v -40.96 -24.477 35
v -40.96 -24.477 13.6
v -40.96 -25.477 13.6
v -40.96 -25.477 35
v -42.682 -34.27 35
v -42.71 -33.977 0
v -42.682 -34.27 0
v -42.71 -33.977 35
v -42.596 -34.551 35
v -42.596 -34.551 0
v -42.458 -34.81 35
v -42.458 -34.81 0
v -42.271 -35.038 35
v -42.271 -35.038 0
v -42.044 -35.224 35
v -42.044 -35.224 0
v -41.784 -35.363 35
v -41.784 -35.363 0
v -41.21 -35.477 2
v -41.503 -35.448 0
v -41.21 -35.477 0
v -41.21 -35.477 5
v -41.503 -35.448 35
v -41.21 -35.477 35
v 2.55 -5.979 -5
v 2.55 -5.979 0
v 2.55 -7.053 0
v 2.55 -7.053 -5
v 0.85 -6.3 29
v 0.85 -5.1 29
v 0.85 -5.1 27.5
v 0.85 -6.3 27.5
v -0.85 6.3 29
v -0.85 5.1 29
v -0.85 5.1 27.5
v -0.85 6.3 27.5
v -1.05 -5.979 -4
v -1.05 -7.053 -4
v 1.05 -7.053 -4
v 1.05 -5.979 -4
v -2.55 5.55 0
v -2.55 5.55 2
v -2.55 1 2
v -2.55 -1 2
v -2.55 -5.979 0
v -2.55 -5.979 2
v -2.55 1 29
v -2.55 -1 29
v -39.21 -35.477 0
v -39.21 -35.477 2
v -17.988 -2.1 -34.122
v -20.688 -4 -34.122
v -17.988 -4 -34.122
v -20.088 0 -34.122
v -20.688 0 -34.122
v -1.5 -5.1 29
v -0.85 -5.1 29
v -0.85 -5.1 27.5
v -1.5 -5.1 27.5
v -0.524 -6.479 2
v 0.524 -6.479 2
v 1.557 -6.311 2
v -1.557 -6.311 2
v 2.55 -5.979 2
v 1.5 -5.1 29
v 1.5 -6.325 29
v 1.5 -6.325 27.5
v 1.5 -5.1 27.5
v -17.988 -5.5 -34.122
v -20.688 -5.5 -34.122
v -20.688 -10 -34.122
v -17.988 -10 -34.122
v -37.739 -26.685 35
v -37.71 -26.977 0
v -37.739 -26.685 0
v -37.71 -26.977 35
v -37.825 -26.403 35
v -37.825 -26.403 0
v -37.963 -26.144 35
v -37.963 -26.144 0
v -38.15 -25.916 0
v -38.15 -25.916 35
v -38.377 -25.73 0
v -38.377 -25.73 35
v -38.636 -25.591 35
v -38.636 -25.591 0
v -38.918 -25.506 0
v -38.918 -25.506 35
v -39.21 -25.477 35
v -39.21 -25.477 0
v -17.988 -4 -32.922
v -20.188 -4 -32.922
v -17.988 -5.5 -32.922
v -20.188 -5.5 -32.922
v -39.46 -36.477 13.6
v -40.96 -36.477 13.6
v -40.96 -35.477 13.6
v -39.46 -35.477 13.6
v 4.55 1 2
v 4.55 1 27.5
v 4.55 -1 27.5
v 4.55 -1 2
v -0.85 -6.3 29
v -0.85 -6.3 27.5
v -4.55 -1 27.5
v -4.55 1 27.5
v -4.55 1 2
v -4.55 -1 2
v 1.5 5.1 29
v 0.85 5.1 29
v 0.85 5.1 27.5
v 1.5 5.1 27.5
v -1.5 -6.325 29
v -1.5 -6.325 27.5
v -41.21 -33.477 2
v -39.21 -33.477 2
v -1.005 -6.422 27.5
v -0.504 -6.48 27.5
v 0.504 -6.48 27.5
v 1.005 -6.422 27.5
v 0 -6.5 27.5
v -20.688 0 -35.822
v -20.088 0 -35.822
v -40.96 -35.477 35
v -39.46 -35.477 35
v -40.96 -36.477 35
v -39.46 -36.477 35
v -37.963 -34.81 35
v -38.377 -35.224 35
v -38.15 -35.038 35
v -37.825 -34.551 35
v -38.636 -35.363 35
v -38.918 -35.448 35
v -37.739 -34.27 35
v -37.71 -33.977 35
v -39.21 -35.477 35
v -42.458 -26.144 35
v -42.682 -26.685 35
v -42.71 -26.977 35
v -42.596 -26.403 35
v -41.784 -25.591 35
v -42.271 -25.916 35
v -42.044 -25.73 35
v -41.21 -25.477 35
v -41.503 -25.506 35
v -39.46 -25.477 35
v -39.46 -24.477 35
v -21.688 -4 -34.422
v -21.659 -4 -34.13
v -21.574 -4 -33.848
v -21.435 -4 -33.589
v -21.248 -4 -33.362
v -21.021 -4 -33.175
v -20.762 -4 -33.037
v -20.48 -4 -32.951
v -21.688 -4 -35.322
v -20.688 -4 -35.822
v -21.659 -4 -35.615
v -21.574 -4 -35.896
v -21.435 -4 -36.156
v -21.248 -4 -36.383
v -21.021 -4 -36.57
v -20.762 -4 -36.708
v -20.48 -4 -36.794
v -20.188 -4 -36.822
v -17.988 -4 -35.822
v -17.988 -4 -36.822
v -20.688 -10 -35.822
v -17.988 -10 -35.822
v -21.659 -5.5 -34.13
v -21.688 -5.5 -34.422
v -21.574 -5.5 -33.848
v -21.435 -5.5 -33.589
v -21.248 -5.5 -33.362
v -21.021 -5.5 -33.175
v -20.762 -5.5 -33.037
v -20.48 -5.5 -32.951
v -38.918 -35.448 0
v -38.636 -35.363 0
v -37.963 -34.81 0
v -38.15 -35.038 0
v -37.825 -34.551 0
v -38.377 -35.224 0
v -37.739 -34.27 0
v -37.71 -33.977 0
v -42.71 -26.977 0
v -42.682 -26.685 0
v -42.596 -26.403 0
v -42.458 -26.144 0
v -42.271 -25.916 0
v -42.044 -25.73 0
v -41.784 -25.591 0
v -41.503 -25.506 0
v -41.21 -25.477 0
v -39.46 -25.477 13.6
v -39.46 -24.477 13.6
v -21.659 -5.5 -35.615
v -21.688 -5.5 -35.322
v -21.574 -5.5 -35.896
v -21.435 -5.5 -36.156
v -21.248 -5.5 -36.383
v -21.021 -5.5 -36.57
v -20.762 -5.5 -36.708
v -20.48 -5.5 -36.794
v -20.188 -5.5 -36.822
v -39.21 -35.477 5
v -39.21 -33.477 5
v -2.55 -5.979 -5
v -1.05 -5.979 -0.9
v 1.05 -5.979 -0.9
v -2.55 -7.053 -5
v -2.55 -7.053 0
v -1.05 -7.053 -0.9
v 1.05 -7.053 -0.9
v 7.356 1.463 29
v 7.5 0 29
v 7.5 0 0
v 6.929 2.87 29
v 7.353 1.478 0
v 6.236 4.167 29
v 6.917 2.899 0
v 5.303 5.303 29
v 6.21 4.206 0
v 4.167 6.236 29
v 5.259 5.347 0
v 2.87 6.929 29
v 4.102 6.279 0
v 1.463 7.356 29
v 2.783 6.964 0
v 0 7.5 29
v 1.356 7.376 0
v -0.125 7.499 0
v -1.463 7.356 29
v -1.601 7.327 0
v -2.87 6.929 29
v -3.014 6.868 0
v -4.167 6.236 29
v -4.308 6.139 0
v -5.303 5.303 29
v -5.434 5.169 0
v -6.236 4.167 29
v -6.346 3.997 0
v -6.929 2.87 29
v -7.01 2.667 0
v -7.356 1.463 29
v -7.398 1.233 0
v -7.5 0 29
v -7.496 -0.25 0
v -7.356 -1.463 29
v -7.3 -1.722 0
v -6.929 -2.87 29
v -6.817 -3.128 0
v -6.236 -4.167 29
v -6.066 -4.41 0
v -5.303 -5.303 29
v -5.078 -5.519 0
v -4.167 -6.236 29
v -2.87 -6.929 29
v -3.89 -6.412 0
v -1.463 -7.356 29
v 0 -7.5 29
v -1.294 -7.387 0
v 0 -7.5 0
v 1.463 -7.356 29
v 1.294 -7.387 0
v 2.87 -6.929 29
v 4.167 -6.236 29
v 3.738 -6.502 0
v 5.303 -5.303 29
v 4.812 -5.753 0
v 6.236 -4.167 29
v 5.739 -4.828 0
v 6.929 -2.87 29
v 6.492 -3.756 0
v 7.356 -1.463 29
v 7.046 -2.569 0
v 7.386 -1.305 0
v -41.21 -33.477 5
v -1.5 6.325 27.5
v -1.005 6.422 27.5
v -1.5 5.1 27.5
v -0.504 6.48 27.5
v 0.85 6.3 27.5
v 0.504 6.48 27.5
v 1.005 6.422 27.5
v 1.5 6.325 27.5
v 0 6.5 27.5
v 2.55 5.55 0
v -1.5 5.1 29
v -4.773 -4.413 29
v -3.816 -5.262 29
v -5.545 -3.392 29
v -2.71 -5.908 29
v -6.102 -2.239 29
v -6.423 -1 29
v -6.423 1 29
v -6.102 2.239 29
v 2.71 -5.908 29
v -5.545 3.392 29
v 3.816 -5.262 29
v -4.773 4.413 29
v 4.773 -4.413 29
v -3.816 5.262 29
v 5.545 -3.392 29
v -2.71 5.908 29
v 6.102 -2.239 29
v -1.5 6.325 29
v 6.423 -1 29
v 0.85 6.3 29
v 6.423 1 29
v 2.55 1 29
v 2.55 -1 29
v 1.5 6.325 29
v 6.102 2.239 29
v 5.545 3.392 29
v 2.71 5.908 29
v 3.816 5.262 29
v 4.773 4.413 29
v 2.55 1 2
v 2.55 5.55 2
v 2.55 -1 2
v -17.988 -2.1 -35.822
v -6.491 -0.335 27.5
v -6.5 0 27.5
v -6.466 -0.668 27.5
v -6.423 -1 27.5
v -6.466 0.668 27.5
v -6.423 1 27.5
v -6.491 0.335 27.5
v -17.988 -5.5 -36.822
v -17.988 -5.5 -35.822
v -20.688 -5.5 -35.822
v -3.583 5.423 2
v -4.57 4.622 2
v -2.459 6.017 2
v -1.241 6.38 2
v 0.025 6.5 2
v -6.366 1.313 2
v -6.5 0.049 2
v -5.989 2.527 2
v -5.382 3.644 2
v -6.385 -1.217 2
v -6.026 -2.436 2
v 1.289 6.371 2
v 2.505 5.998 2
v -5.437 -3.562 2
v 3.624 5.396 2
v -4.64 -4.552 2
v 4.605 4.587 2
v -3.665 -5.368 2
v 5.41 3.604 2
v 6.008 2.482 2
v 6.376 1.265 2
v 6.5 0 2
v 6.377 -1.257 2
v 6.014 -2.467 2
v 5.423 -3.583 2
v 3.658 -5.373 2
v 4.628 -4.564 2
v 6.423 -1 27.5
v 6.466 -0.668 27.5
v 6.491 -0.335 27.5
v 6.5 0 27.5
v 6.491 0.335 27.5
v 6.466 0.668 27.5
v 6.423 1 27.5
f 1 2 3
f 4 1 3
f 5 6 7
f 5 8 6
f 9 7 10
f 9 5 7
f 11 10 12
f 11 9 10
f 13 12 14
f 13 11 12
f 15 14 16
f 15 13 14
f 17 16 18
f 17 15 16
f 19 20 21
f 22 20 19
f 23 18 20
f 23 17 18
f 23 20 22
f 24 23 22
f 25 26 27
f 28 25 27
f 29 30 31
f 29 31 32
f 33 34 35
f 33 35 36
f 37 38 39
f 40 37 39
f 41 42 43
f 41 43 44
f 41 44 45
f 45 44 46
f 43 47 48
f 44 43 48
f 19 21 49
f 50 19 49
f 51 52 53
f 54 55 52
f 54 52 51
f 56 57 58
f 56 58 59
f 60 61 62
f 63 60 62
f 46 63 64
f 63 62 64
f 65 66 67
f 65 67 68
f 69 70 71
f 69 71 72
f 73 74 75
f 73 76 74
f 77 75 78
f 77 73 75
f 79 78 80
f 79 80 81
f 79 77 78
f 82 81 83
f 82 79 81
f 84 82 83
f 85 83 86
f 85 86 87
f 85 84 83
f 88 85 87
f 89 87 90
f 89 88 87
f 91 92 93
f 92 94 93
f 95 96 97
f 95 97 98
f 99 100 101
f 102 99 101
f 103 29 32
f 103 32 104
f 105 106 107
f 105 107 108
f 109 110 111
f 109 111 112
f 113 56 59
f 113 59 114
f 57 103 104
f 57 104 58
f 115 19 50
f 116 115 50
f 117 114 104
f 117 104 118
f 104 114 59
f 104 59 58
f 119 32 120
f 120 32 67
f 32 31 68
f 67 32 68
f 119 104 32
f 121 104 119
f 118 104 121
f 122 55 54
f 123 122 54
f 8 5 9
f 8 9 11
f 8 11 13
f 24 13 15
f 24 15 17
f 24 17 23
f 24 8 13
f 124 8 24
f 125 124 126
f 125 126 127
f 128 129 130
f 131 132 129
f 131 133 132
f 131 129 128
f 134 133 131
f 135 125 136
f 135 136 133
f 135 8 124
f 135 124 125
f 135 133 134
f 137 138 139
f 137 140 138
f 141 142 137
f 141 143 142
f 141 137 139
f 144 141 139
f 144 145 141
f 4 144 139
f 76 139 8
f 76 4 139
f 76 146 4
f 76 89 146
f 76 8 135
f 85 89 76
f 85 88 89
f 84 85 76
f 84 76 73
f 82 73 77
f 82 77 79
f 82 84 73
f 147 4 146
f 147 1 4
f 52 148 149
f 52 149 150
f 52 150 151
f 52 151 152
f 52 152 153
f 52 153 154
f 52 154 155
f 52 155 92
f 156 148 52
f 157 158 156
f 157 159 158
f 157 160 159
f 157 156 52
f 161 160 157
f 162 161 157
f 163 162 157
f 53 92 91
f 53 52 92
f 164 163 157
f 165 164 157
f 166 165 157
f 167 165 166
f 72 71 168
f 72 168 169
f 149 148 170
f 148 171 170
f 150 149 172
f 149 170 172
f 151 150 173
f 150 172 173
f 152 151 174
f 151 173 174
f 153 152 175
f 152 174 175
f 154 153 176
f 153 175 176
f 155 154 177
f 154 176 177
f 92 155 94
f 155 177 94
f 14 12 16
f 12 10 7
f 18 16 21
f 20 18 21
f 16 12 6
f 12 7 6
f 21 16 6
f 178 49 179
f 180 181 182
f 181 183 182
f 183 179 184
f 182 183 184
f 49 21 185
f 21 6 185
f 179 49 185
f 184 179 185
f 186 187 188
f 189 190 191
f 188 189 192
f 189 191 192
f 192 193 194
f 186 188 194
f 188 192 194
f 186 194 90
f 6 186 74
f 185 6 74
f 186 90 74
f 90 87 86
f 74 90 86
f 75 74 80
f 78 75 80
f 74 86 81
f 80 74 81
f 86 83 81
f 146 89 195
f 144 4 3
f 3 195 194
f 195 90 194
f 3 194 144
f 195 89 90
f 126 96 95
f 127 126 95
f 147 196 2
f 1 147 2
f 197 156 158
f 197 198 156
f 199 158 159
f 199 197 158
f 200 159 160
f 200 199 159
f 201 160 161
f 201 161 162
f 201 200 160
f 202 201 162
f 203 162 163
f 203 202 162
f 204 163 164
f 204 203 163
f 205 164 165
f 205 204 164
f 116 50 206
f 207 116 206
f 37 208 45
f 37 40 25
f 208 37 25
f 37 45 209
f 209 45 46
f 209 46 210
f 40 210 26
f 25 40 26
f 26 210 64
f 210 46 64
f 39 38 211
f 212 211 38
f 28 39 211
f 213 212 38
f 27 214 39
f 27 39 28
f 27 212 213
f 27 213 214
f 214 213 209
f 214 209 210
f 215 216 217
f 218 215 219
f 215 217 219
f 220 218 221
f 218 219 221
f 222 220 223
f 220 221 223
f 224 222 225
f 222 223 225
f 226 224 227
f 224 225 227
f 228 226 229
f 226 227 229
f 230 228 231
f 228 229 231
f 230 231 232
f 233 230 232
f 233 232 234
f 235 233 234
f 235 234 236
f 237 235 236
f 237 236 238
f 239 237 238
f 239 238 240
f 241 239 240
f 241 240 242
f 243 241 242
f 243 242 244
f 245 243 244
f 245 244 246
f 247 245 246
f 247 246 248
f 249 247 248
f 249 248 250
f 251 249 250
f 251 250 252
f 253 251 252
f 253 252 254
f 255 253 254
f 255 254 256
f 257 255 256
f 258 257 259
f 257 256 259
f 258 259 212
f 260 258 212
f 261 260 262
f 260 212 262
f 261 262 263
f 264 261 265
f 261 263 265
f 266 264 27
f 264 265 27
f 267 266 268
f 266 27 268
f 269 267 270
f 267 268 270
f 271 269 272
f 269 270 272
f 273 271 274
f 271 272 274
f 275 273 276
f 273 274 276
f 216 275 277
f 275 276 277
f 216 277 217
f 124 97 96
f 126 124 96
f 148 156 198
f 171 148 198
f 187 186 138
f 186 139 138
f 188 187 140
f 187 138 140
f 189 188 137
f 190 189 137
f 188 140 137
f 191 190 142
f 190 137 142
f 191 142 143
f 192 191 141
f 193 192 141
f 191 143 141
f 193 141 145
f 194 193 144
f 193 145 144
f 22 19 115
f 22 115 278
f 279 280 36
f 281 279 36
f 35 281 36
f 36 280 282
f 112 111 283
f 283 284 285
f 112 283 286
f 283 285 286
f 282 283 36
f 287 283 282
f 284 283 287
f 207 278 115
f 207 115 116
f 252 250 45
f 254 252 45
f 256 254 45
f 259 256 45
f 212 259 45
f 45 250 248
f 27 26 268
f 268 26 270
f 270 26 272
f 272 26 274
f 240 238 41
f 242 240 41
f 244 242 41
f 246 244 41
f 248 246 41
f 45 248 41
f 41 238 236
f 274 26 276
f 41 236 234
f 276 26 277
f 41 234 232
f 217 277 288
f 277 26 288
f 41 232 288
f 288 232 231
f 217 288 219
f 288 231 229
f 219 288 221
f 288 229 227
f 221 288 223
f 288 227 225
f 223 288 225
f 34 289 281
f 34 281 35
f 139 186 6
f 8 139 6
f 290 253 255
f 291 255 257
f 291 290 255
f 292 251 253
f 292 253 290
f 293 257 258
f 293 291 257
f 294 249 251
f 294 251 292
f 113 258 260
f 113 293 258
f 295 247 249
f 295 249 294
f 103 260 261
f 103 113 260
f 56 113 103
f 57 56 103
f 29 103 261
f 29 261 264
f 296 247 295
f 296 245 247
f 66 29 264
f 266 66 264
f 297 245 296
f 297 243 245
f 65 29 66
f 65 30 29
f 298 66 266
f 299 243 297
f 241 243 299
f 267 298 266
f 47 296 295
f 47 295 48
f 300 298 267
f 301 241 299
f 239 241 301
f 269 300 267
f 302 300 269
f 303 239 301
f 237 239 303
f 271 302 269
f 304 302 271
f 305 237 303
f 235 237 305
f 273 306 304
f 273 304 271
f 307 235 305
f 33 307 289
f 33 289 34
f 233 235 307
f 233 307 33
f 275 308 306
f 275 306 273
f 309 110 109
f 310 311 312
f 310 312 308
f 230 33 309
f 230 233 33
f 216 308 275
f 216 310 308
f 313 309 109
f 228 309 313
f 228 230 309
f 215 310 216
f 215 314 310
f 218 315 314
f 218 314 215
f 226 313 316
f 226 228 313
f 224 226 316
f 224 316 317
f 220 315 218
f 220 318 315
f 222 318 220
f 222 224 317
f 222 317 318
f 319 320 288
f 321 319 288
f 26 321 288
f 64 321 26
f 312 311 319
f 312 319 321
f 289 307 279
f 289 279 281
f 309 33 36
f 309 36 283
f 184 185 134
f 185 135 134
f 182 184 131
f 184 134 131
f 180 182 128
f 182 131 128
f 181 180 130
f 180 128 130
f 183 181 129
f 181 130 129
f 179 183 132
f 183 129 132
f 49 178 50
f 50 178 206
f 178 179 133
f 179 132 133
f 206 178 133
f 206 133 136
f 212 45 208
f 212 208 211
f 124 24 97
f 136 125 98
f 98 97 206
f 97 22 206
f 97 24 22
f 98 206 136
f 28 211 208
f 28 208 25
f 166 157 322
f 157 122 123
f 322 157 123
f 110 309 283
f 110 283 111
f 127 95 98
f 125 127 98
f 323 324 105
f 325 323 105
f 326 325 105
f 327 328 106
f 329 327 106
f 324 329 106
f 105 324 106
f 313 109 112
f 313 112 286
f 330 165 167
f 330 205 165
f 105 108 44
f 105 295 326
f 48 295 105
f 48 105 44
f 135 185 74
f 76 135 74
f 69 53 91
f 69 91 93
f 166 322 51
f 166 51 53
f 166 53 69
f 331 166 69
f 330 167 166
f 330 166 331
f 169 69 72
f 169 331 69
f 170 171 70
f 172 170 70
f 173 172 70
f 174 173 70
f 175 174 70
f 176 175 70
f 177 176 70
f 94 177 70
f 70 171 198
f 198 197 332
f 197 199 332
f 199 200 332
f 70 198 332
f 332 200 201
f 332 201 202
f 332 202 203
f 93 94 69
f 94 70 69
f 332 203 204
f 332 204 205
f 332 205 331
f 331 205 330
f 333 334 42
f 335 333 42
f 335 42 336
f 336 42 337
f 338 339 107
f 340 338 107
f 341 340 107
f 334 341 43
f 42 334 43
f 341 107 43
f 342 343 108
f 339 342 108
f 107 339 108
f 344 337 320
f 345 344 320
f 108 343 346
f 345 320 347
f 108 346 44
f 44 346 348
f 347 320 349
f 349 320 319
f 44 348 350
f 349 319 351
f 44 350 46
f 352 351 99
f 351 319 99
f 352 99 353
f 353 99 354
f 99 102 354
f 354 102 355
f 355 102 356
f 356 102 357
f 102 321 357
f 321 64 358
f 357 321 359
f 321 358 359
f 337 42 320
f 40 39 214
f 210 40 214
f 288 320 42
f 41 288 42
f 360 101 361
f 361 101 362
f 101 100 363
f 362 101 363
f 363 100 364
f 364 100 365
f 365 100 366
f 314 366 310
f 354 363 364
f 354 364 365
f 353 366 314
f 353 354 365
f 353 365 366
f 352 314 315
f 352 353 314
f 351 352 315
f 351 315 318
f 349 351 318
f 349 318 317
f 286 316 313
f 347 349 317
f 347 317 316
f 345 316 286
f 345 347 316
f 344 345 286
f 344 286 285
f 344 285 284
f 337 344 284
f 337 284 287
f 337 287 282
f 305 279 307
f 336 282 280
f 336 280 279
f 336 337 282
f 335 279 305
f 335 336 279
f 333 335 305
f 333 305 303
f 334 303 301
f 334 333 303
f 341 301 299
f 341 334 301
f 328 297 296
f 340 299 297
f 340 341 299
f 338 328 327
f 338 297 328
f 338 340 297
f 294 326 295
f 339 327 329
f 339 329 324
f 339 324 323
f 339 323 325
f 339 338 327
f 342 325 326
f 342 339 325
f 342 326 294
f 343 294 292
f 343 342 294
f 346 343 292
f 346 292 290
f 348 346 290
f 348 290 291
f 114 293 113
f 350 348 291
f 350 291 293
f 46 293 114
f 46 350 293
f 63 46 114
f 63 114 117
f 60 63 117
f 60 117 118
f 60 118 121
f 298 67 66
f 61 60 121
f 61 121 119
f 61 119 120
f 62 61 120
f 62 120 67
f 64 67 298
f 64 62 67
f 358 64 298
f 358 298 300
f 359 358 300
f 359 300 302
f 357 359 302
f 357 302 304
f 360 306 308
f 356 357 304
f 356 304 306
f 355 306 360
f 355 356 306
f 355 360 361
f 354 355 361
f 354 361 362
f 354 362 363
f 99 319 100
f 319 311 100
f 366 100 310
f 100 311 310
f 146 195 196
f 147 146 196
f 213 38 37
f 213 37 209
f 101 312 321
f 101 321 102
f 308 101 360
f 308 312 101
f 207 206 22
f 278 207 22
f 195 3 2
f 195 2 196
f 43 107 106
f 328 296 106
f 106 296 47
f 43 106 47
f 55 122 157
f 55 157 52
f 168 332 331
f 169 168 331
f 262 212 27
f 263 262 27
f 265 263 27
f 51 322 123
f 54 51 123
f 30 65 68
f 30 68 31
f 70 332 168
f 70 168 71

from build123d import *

# Parameters (mm, degrees)
F0_R           = 7.5
F1_DEPTH       = 29
F2_R           = 6.5
F3_DEPTH       = 30
F4_R           = 7.5
F4_R_2         = 6.5
F5_DEPTH       = 2
F7_DEPTH       = 35
F9_DEPTH       = 1.5
F10_W          = 1.5
F10_H          = 1
F11_DEPTH      = 13.6
F13_DEPTH      = 25
F14_R          = 1.5
F15_W          = 1
F15_H          = 3
F16_DEPTH      = 2
F17_W          = 5.1
F17_H          = 1.0742694599
F18_DEPTH      = 5
F19_W          = 2.1
F19_H          = 3.1
F20_DEPTH      = 25
F21_W          = 2.7
F21_H          = 1.7
F22_DEPTH      = 10
F24_DEPTH      = 25
F25_W          = 2
F25_H          = 2
F26_DEPTH      = 25.5
F27_W          = 3.7
F27_H          = 1.5
F28_DEPTH      = 1
F28_DEPTH_BACK = 2.9
F29_R          = 1.5


# Not quite as in the source:
# - a feature names something its author has since deleted; it is built from what else it names


with BuildPart() as f1:
    # F0 (on Top) → F1 (new body)
    with BuildSketch(Plane.XY):
        Circle(F0_R)
    extrude(amount=F1_DEPTH)

    # F2 (on Top) → F3 (cut)
    with BuildSketch(Plane.XY):
        Circle(F2_R)
    extrude(amount=F3_DEPTH, mode=Mode.SUBTRACT)

    # F4 (on face) → F5 (join)
    with BuildSketch(Plane(origin=(0, 0, 0), x_dir=(1, 0, 0), z_dir=(0, 0, -1))):
        Circle(F4_R)
        Circle(F4_R_2, mode=Mode.SUBTRACT)
        Circle(F4_R_2)
    extrude(amount=-F5_DEPTH)

    # F8 (on face) → F9 (join)
    with BuildSketch(Plane.XY.offset(29)):
        with BuildLine():
            Line((-2.55, 1), (-5.9160797831, 1))
            ThreePointArc((-5.9160797831, 1), (-6, 0), (-5.9160797831, -1))
            Line((-5.9160797831, -1), (-2.55, -1))
            Line((-2.55, -1), (-2.55, 1))
        make_face()
        with BuildLine():
            ThreePointArc((5.9160797831, -1), (6, 0), (5.9160797831, 1))
            Line((5.9160797831, 1), (2.55, 1))
            Line((2.55, 1), (2.55, -1))
            Line((2.55, -1), (5.9160797831, -1))
        make_face()
        with BuildLine():
            ThreePointArc((-5.9160797831, -1), (-6, 0), (-5.9160797831, 1))
            Line((-5.9160797831, 1), (-6.4226162893, 1))
            ThreePointArc((-6.4226162893, 1), (-6.4806251967, 0.5014948252), (-6.5, 0))
            ThreePointArc((-6.5, 0), (-6.4806251967, -0.5014948252), (-6.4226162893, -1))
            Line((-6.4226162893, -1), (-5.9160797831, -1))
        make_face()
        with BuildLine():
            ThreePointArc((6.5, 0), (6.4806251967, 0.5014948252), (6.4226162893, 1))
            Line((6.4226162893, 1), (5.9160797831, 1))
            ThreePointArc((5.9160797831, 1), (6, 0), (5.9160797831, -1))
            Line((5.9160797831, -1), (6.4226162893, -1))
            ThreePointArc((6.4226162893, -1), (6.4806251967, -0.5014948252), (6.5, 0))
        make_face()
        with BuildLine():
            ThreePointArc((0, 6.5), (-0.7551127127, 6.4559898382), (-1.5, 6.3245553203))
            Line((-1.5, 6.3245553203), (-1.5, 5.1))
            Line((-1.5, 5.1), (-0.85, 5.1))
            Line((-0.85, 5.1), (-0.85, 6.3))
            Line((-0.85, 6.3), (0.85, 6.3))
            Line((0.85, 6.3), (0.85, 5.1))
            Line((0.85, 5.1), (1.5, 5.1))
            Line((1.5, 5.1), (1.5, 6.3245553203))
            ThreePointArc((1.5, 6.3245553203), (0.7551127127, 6.4559898382), (0, 6.5))
        make_face()
        with BuildLine():
            Line((-1.5, -5.1), (-1.5, -6.3245553203))
            ThreePointArc((-1.5, -6.3245553203), (-0.7551127127, -6.4559898382), (0, -6.5))
            ThreePointArc((0, -6.5), (0.7551127127, -6.4559898382), (1.5, -6.3245553203))
            Line((1.5, -6.3245553203), (1.5, -5.1))
            Line((1.5, -5.1), (0.85, -5.1))
            Line((0.85, -5.1), (0.85, -6.3))
            Line((0.85, -6.3), (-0.85, -6.3))
            Line((-0.85, -6.3), (-0.85, -5.1))
            Line((-0.85, -5.1), (-1.5, -5.1))
        make_face()
    extrude(amount=-F9_DEPTH)

    # F12 (on face) → F13 (cut)
    with BuildSketch(Plane.XY.offset(2)):
        Polygon((-2.55, 5.55), (-2.55, 1), (-2.55, -1), (-2.55, -5.9789213074), (2.55, -5.9789213074), (2.55, -1), (2.55, 1), (2.55, 5.55), (-0.3, 5.55), (-1, 5.55), align=None)
    extrude(amount=-F13_DEPTH, mode=Mode.SUBTRACT)

    # F17 (on face) → F18 (join)
    with BuildSketch(Plane(origin=(0, 0, 0), x_dir=(1, 0, 0), z_dir=(0, 0, -1))):
        with Locations((0, 6.5160560373)):
            Rectangle(F17_W, F17_H)
    extrude(amount=F18_DEPTH)

    # F19 (on face) → F20 (cut)
    with BuildSketch(Plane.XZ.offset(7.0531907673)):
        with Locations((0, -2.45)):
            Rectangle(F19_W, F19_H)
    extrude(amount=-F20_DEPTH, mode=Mode.SUBTRACT)

    # F25 (on face) → F26 (join, through all)
    with BuildSketch(Plane(origin=(0, 0, 27.5), x_dir=(1, 0, 0), z_dir=(0, 0, -1))):
        with Locations((3.55, 0)):
            Rectangle(F25_W, F25_H)
        with Locations((-3.55, 0)):
            Rectangle(F25_W, F25_H)
    extrude(amount=F26_DEPTH)


with BuildPart() as f7:
    # F6 (on Top) → F7 (new body)
    with BuildSketch(Plane.XY):
        Polygon((-42.7104520947, -25.4771374032), (-42.7104520947, -35.4771374032), (-40.9604520947, -35.4771374032), (-40.9604520947, -36.4771374032), (-39.4604520947, -36.4771374032), (-39.4604520947, -35.4771374032), (-37.7104520947, -35.4771374032), (-37.7104520947, -25.4771374032), (-39.4604520947, -25.4771374032), (-39.4604520947, -24.4771374032), (-40.9604520947, -24.4771374032), (-40.9604520947, -25.4771374032), align=None)
    extrude(amount=F7_DEPTH)

    # F10 (on face) → F11 (cut)
    with BuildSketch(Plane(origin=(0, 0, 0), x_dir=(1, 0, 0), z_dir=(0, 0, -1))):
        with Locations((-40.2104520947, 24.9771374032)):
            Rectangle(F10_W, F10_H)
        with Locations((-40.2104520947, 35.9771374032)):
            Rectangle(F10_W, F10_H)
    extrude(amount=-F11_DEPTH, mode=Mode.SUBTRACT)

    # F14
    f14_edges = [f7.edges().sort_by_distance(p)[0] for p in [
        (-42.710452, -25.477137, 17.5),
        (-37.710452, -25.477137, 17.5),
        (-37.710452, -35.477137, 17.5),
        (-42.710452, -35.477137, 17.5),
    ]]
    fillet(f14_edges, radius=F14_R)

    # F15 (on face) → F16 (cut)
    with BuildSketch(Plane.XZ.offset(35.4771374032)):
        with Locations((-40.7104520947, 3.5)):
            Rectangle(F15_W, F15_H)
        with Locations((-39.7104520947, 3.5)):
            Rectangle(F15_W, F15_H)
    extrude(amount=-F16_DEPTH, mode=Mode.SUBTRACT)


with BuildPart() as f22:
    # F21 (on Front) → F22 (new body)
    with BuildSketch(Plane.XZ):
        with Locations((-19.3377515213, -34.9723634064)):
            Rectangle(F21_W, F21_H)
    extrude(amount=F22_DEPTH)

    # F23 (on face) → F24 (cut)
    with BuildSketch(Plane(origin=(0, 0, -35.8223634064), x_dir=(1, 0, 0), z_dir=(0, 0, -1))):
        Polygon((-17.9877515213, 0), (-17.9877515213, 2.1), (-20.0877515213, 0), align=None)
    extrude(amount=-F24_DEPTH, mode=Mode.SUBTRACT)

    # F27 (on face) → F28 (join, two sides)
    with BuildSketch(Plane(origin=(0, 0, -35.8223634064), x_dir=(1, 0, 0), z_dir=(0, 0, -1))) as f28_sk:
        with Locations((-19.8377515213, 4.75)):
            Rectangle(F27_W, F27_H)
    extrude(amount=F28_DEPTH)
    extrude(f28_sk.sketch, amount=-F28_DEPTH_BACK)

    # F29
    f29_edges = [f22.edges().sort_by_distance(p)[0] for p in [
        (-21.687752, -4.75, -36.822363),
        (-21.687752, -4.75, -32.922363),
    ]]
    fillet(f29_edges, radius=F29_R)


solid = Compound([f1.part, f7.part, f22.part])
